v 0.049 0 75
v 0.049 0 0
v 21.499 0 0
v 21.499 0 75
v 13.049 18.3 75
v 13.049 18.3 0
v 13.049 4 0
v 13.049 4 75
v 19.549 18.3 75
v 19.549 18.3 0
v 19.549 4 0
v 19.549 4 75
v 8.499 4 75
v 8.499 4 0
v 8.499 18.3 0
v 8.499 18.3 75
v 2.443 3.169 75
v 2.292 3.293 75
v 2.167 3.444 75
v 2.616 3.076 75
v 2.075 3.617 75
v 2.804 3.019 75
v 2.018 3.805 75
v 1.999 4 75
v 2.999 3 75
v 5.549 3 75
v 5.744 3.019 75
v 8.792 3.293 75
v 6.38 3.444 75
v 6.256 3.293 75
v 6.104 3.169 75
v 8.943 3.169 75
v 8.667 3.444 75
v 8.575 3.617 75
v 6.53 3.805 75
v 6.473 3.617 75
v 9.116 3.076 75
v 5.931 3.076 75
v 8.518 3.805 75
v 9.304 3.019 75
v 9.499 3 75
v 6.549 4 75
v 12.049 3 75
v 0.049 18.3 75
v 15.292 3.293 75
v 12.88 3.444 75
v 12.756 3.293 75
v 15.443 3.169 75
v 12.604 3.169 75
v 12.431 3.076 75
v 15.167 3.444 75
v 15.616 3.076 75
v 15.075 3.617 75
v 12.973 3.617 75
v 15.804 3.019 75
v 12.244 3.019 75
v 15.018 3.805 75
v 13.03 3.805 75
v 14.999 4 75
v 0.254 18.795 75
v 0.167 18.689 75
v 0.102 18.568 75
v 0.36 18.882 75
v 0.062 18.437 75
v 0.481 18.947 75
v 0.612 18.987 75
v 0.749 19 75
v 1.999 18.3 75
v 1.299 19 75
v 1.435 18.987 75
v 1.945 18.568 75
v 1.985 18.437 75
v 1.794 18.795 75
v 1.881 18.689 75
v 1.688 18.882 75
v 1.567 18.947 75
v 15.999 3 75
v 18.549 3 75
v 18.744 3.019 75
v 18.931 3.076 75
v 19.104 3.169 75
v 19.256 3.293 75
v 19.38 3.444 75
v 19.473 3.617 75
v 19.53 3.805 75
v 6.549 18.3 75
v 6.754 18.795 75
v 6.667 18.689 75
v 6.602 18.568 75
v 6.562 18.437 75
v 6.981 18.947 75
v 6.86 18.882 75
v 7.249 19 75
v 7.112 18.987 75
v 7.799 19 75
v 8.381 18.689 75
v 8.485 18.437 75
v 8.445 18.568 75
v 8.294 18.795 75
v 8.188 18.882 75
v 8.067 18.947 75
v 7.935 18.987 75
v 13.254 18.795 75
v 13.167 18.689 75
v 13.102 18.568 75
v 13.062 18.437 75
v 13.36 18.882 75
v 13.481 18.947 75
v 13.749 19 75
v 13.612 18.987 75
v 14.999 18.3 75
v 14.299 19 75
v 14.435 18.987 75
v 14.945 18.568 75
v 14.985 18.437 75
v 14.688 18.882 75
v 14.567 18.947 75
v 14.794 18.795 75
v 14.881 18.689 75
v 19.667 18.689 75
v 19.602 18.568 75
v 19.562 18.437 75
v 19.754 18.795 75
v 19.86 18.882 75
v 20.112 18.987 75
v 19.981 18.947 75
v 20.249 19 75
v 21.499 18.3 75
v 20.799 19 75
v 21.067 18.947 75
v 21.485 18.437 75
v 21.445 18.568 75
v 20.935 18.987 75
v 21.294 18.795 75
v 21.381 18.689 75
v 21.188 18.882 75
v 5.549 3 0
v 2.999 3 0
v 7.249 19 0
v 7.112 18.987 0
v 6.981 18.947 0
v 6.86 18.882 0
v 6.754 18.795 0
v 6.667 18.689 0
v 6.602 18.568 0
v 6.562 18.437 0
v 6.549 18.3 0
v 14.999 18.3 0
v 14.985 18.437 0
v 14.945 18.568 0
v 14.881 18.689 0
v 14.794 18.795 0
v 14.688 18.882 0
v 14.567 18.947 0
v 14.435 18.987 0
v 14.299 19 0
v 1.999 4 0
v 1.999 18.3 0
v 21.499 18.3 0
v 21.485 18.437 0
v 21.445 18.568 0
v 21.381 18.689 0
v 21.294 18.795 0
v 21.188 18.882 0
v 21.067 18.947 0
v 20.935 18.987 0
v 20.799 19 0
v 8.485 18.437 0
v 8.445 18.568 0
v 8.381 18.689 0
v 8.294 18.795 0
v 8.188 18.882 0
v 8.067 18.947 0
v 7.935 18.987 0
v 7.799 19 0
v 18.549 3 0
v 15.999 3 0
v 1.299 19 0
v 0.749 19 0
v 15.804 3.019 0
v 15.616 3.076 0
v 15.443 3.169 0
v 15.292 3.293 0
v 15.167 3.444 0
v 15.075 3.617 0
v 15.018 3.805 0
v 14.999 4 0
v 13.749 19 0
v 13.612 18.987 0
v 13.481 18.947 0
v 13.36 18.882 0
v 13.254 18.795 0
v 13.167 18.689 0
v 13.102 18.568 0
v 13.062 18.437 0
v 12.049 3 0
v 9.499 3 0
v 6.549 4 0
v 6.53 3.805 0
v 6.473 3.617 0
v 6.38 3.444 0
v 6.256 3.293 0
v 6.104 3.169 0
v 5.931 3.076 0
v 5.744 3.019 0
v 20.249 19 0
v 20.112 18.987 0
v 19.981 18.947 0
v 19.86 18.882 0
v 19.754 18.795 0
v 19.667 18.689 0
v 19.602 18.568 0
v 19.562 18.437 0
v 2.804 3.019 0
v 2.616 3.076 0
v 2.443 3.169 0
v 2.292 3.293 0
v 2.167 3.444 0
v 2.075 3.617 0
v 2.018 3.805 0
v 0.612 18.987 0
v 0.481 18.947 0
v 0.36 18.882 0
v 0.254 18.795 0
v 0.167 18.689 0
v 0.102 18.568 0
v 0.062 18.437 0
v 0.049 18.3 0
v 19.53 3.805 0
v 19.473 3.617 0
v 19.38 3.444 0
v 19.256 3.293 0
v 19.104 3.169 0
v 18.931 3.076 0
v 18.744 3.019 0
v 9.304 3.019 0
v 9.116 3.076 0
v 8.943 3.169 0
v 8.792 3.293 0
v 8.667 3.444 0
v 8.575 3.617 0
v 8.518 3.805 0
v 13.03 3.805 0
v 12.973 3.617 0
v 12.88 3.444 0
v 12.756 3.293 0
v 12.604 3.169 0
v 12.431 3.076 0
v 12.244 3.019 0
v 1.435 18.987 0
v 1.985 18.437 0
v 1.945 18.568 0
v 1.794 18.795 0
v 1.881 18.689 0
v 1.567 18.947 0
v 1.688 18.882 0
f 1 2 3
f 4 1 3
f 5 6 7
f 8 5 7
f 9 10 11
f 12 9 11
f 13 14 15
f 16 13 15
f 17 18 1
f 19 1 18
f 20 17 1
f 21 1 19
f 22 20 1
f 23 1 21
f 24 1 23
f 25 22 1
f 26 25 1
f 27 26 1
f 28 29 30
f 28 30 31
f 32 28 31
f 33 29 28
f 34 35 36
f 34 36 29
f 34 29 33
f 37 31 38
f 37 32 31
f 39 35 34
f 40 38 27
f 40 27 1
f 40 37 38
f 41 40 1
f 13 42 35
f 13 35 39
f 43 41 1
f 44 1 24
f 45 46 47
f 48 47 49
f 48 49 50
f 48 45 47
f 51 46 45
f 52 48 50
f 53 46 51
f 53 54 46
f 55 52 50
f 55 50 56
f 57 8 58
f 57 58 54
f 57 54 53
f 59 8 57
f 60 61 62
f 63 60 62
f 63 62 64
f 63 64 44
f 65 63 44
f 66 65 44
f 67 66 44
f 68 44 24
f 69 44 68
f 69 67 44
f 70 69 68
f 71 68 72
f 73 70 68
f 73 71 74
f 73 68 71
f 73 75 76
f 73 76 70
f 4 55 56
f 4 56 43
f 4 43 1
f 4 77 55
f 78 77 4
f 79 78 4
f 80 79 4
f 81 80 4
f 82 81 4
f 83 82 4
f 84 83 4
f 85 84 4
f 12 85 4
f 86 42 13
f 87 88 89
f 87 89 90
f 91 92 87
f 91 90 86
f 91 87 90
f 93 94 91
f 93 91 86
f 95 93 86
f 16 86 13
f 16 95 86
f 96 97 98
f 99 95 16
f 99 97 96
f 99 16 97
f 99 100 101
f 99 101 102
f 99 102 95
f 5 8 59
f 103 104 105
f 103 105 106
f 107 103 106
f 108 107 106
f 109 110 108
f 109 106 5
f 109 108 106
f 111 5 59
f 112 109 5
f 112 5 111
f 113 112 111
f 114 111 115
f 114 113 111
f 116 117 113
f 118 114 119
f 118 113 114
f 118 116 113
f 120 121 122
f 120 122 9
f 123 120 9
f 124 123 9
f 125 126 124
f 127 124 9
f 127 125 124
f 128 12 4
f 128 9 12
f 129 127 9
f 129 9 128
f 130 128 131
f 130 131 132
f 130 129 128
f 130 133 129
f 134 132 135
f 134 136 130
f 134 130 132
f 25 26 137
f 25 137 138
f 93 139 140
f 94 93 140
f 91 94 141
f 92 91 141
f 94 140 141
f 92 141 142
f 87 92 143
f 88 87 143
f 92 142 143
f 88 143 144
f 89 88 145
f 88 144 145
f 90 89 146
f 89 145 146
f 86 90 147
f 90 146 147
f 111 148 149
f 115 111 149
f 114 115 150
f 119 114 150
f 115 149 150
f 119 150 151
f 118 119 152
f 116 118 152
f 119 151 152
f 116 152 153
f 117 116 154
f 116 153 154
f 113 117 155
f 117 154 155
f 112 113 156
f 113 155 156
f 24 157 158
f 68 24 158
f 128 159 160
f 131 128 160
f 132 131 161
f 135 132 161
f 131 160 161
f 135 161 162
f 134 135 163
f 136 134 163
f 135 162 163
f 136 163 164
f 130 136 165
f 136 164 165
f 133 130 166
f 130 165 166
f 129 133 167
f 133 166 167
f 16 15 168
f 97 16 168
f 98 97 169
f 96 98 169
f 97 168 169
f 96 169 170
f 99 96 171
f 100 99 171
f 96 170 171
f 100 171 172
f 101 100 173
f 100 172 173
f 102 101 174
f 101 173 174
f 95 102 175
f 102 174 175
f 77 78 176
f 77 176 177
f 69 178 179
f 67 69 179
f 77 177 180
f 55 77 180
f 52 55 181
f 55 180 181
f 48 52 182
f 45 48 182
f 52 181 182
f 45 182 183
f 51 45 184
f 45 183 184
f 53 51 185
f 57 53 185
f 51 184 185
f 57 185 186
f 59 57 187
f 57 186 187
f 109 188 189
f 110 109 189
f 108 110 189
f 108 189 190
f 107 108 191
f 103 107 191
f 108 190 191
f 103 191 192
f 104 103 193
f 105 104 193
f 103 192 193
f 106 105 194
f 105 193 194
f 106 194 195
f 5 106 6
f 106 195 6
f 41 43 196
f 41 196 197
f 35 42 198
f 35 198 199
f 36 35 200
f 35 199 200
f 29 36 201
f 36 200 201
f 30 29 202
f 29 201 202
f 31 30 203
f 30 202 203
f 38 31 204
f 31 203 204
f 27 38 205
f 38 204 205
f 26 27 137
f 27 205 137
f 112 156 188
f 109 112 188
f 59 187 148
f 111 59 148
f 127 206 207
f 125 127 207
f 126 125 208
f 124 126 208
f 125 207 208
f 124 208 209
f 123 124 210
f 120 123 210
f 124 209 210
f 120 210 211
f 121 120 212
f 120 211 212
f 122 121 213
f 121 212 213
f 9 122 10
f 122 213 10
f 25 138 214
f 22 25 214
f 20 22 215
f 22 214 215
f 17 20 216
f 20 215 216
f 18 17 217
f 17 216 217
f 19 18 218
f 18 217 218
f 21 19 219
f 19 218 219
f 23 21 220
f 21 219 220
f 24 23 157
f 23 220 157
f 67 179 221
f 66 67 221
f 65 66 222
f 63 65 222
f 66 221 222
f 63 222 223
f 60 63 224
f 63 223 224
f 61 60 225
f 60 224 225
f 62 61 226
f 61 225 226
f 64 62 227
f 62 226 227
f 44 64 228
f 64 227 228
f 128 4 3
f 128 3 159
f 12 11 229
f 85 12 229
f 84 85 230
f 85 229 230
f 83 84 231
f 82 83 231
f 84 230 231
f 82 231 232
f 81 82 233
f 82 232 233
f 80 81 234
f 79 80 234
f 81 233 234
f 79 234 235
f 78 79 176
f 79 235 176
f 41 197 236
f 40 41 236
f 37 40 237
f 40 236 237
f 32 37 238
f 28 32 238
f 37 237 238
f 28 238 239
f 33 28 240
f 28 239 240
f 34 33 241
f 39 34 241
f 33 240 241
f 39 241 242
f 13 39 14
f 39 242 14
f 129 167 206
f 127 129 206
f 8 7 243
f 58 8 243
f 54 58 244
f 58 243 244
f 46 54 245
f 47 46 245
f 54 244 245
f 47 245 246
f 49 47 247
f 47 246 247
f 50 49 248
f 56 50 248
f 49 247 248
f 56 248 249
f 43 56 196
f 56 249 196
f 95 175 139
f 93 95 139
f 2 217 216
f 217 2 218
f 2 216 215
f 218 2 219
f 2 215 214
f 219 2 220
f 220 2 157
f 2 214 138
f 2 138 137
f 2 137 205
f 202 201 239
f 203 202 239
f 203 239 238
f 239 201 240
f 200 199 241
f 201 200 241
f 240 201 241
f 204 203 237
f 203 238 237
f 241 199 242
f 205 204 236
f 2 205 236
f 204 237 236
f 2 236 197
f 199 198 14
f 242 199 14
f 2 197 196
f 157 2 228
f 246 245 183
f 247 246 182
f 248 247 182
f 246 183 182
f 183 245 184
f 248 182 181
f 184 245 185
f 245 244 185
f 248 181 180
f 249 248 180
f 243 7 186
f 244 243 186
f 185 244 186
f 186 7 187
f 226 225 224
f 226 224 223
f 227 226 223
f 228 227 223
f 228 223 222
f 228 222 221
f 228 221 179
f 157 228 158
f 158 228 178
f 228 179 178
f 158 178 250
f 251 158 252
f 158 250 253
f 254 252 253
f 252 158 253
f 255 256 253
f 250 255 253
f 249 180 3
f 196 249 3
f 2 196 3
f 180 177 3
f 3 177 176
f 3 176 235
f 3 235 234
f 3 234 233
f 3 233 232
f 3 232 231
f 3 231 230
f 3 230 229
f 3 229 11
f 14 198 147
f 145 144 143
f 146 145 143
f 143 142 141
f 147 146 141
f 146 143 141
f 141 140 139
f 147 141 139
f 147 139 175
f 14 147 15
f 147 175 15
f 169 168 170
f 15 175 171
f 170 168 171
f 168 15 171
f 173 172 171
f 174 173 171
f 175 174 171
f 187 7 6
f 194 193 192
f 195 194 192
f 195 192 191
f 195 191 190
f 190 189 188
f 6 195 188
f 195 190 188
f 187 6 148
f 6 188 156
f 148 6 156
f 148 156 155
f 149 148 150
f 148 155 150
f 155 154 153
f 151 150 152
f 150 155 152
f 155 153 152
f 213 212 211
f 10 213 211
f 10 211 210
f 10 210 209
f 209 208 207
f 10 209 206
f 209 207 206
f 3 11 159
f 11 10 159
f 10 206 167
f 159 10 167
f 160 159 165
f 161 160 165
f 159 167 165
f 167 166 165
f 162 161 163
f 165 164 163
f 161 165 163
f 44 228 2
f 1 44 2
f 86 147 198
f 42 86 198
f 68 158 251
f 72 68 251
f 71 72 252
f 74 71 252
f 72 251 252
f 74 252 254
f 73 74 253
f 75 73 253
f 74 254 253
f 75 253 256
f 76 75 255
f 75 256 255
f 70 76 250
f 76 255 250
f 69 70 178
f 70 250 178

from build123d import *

# Parameters (mm, degrees)
BOSS_EXTRUDE1_DEPTH = 75


with BuildPart() as part:
    # Model → Boss-Extrude1 (new body)
    with BuildSketch(Plane.XY):
        with BuildLine():
            Line((12.048720141, 3), (10.773720141, 3))
            Line((10.773720141, 3), (9.498720141, 3))
            ThreePointArc((9.498720141, 3), (8.79161336, 3.292893219), (8.498720141, 4))
            Line((8.498720141, 4), (8.498720141, 18.3))
            ThreePointArc((8.498720141, 18.3), (8.293694888, 18.794974747), (7.798720141, 19))
            Line((7.798720141, 19), (7.248720141, 19))
            ThreePointArc((7.248720141, 19), (6.753745394, 18.794974747), (6.548720141, 18.3))
            Line((6.548720141, 18.3), (6.548720141, 4))
            ThreePointArc((6.548720141, 4), (6.255826922, 3.292893219), (5.548720141, 3))
            Line((5.548720141, 3), (2.998720141, 3))
            ThreePointArc((2.998720141, 3), (2.29161336, 3.292893219), (1.998720141, 4))
            Line((1.998720141, 4), (1.998720141, 18.3))
            ThreePointArc((1.998720141, 18.3), (1.793694888, 18.794974747), (1.298720141, 19))
            Line((1.298720141, 19), (0.748720141, 19))
            ThreePointArc((0.748720141, 19), (0.253745394, 18.794974747), (0.048720141, 18.3))
            Line((0.048720141, 18.3), (0.048720141, 0))
            Line((0.048720141, 0), (10.773720141, 0))
            Line((10.773720141, 0), (21.498720141, 0))
            Line((21.498720141, 0), (21.498720141, 18.3))
            ThreePointArc((21.498720141, 18.3), (21.293694888, 18.794974747), (20.798720141, 19))
            Line((20.798720141, 19), (20.248720141, 19))
            ThreePointArc((20.248720141, 19), (19.753745394, 18.794974747), (19.548720141, 18.3))
            Line((19.548720141, 18.3), (19.548720141, 4))
            ThreePointArc((19.548720141, 4), (19.255826922, 3.292893219), (18.548720141, 3))
            Line((18.548720141, 3), (15.998720141, 3))
            ThreePointArc((15.998720141, 3), (15.29161336, 3.292893219), (14.998720141, 4))
            Line((14.998720141, 4), (14.998720141, 18.3))
            ThreePointArc((14.998720141, 18.3), (14.793694888, 18.794974747), (14.298720141, 19))
            Line((14.298720141, 19), (13.748720141, 19))
            ThreePointArc((13.748720141, 19), (13.253745394, 18.794974747), (13.048720141, 18.3))
            Line((13.048720141, 18.3), (13.048720141, 4))
            ThreePointArc((13.048720141, 4), (12.755826922, 3.292893219), (12.048720141, 3))
        make_face()
    extrude(amount=BOSS_EXTRUDE1_DEPTH)


solid = part.part
